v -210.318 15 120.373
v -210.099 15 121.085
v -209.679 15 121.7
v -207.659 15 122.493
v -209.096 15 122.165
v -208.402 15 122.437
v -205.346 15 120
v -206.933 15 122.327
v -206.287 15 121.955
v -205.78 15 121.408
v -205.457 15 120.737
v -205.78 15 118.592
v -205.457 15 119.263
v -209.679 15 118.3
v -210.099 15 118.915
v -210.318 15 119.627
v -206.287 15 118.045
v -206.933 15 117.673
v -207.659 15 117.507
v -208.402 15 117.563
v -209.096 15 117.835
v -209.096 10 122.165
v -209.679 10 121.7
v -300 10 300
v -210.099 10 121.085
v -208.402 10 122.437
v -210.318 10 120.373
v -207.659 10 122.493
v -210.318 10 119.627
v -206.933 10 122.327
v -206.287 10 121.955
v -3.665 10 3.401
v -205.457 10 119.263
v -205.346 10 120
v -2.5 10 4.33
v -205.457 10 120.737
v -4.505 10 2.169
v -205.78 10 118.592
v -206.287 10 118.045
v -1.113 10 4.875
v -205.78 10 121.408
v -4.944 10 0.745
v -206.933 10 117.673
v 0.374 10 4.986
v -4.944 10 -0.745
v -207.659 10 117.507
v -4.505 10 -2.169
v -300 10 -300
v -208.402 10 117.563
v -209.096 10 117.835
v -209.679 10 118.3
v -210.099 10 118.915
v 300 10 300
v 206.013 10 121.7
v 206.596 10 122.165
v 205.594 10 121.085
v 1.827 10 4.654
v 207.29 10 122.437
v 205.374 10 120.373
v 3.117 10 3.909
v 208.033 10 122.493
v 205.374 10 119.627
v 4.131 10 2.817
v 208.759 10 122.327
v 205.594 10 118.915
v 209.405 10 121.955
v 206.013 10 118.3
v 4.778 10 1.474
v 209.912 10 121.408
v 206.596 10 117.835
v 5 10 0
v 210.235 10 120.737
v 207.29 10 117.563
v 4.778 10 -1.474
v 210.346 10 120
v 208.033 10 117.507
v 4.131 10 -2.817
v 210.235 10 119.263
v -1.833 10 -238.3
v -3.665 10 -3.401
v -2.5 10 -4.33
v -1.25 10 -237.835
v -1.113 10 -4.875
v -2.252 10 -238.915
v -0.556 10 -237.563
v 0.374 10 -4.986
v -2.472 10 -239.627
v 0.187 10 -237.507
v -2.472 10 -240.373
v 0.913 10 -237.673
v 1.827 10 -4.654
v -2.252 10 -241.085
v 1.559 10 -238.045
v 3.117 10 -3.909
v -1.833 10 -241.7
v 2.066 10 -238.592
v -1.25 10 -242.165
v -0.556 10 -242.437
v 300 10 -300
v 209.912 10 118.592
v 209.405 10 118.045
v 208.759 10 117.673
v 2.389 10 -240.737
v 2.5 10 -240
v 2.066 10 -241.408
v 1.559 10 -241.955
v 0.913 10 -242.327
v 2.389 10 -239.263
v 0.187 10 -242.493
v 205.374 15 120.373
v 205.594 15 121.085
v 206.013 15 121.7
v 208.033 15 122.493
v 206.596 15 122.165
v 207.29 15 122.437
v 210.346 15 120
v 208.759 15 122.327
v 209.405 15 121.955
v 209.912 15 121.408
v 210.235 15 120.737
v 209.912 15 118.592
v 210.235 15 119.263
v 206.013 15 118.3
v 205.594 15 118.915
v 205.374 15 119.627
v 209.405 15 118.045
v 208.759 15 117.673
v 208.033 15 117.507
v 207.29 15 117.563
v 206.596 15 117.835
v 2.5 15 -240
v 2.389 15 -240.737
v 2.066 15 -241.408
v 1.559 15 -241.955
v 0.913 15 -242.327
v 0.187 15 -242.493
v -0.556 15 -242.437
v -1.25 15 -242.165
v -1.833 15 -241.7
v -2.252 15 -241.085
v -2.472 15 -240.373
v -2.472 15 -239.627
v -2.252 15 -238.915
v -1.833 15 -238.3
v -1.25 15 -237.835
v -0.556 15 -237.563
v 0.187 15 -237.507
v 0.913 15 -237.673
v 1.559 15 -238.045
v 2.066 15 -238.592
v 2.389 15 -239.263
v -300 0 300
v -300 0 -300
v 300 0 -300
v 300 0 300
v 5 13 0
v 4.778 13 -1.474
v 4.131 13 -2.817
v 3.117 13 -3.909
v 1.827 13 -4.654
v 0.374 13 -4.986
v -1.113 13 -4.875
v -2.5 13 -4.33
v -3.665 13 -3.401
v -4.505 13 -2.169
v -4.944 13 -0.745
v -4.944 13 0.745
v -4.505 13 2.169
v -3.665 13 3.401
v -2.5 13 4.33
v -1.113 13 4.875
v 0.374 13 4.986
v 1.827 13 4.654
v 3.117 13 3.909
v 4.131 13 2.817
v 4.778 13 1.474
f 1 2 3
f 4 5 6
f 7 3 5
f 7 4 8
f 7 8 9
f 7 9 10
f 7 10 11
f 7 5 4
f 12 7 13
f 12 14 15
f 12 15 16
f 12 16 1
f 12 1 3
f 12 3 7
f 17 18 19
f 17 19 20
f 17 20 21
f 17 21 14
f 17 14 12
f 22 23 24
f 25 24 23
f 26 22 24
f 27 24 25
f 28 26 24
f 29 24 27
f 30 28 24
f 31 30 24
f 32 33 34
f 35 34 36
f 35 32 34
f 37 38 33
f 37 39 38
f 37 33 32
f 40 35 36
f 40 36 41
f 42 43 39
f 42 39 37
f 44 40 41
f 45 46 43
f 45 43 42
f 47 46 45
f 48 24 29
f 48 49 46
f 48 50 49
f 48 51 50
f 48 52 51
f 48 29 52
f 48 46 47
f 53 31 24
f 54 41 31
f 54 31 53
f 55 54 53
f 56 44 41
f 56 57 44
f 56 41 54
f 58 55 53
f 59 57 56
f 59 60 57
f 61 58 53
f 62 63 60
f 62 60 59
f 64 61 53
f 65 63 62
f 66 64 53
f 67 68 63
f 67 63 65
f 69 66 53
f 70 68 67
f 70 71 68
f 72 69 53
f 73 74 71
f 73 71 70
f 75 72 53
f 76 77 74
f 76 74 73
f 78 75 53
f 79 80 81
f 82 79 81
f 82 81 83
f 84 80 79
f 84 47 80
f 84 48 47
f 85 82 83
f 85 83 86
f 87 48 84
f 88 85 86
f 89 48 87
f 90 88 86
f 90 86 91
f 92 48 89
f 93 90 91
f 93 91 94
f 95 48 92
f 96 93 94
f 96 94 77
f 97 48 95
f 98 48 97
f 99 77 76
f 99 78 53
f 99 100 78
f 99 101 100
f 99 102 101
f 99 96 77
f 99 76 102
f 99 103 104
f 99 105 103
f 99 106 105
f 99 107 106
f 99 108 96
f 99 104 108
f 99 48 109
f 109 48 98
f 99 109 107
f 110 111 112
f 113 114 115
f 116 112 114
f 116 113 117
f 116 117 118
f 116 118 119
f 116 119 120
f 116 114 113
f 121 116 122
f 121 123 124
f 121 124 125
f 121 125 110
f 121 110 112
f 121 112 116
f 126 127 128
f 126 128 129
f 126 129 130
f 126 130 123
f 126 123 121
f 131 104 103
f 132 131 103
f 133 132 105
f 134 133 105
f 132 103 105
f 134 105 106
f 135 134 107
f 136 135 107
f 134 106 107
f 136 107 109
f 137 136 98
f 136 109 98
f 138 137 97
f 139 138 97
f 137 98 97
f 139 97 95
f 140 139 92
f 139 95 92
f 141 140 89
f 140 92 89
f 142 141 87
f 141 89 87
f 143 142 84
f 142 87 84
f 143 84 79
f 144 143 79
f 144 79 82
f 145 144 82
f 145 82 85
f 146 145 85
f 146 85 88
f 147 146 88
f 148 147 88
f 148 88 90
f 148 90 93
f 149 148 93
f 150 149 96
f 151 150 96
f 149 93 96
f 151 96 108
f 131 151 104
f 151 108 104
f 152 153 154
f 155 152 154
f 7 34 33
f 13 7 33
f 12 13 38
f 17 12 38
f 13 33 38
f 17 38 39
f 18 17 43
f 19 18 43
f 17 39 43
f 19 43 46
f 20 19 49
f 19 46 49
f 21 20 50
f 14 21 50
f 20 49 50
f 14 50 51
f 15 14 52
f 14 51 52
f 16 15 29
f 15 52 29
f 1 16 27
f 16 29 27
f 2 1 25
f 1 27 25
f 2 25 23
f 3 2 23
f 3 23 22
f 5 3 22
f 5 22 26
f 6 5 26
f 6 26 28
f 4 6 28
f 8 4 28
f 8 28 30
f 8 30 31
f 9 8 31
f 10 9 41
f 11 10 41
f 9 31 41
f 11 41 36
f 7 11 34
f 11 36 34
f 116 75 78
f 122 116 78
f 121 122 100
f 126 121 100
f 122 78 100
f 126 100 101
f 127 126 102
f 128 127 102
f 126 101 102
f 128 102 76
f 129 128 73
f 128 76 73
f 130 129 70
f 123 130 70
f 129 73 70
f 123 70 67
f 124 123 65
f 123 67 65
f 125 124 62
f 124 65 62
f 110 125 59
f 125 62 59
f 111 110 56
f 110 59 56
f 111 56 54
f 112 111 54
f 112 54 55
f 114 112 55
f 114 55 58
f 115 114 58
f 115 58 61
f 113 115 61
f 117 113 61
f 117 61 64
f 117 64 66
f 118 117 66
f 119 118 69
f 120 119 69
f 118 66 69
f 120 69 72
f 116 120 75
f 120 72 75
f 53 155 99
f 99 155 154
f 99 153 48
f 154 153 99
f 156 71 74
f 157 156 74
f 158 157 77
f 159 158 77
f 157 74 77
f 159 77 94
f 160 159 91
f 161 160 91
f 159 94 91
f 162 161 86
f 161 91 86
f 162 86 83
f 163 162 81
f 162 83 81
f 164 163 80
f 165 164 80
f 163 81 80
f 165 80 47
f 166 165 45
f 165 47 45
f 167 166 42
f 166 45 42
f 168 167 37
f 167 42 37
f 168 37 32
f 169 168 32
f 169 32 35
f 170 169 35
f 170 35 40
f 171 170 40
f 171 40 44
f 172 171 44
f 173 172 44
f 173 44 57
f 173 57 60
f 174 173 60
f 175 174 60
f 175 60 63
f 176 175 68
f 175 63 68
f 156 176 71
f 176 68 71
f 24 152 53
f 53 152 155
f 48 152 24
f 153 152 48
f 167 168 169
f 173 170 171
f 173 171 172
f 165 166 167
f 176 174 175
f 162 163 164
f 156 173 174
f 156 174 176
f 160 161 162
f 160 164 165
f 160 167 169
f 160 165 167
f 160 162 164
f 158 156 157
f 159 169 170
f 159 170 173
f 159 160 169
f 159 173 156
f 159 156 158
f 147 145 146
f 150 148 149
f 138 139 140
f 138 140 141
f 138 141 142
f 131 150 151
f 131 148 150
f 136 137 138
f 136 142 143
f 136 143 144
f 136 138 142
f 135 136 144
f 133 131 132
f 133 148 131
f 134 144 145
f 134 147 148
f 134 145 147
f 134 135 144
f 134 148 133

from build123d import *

# Parameters (mm, degrees)
SKETCH_2_W      = 600
SKETCH_2_H      = 600
EXTRUDE_1_DEPTH = 10
SKETCH_3_R      = 2.5
EXTRUDE_2_DEPTH = 5
SKETCH_4_R      = 5
EXTRUDE_3_DEPTH = 3


with BuildPart() as part:
    # 草图2 → 凸台-拉伸1 (new body)
    with BuildSketch(Plane(origin=(0, 0, 0), x_dir=(1, 0, 0), z_dir=(0, 1, 0))):
        Rectangle(SKETCH_2_W, SKETCH_2_H)
    extrude(amount=EXTRUDE_1_DEPTH)

    # 草图3 → 凸台-拉伸2 (add)
    with BuildSketch(Plane(origin=(0, 10, 0), x_dir=(1, 0, 0), z_dir=(0, 1, 0))):
        with Locations((0, 240)):
            Circle(SKETCH_3_R)
        with Locations((-207.846096908, -120)):
            Circle(SKETCH_3_R)
        with Locations((207.846096908, -120)):
            Circle(SKETCH_3_R)
    extrude(amount=EXTRUDE_2_DEPTH)

    # 草图4 → 凸台-拉伸3 (add)
    with BuildSketch(Plane(origin=(0, 10, 0), x_dir=(1, 0, 0), z_dir=(0, 1, 0))):
        Circle(SKETCH_4_R)
    extrude(amount=EXTRUDE_3_DEPTH)


solid = part.part
